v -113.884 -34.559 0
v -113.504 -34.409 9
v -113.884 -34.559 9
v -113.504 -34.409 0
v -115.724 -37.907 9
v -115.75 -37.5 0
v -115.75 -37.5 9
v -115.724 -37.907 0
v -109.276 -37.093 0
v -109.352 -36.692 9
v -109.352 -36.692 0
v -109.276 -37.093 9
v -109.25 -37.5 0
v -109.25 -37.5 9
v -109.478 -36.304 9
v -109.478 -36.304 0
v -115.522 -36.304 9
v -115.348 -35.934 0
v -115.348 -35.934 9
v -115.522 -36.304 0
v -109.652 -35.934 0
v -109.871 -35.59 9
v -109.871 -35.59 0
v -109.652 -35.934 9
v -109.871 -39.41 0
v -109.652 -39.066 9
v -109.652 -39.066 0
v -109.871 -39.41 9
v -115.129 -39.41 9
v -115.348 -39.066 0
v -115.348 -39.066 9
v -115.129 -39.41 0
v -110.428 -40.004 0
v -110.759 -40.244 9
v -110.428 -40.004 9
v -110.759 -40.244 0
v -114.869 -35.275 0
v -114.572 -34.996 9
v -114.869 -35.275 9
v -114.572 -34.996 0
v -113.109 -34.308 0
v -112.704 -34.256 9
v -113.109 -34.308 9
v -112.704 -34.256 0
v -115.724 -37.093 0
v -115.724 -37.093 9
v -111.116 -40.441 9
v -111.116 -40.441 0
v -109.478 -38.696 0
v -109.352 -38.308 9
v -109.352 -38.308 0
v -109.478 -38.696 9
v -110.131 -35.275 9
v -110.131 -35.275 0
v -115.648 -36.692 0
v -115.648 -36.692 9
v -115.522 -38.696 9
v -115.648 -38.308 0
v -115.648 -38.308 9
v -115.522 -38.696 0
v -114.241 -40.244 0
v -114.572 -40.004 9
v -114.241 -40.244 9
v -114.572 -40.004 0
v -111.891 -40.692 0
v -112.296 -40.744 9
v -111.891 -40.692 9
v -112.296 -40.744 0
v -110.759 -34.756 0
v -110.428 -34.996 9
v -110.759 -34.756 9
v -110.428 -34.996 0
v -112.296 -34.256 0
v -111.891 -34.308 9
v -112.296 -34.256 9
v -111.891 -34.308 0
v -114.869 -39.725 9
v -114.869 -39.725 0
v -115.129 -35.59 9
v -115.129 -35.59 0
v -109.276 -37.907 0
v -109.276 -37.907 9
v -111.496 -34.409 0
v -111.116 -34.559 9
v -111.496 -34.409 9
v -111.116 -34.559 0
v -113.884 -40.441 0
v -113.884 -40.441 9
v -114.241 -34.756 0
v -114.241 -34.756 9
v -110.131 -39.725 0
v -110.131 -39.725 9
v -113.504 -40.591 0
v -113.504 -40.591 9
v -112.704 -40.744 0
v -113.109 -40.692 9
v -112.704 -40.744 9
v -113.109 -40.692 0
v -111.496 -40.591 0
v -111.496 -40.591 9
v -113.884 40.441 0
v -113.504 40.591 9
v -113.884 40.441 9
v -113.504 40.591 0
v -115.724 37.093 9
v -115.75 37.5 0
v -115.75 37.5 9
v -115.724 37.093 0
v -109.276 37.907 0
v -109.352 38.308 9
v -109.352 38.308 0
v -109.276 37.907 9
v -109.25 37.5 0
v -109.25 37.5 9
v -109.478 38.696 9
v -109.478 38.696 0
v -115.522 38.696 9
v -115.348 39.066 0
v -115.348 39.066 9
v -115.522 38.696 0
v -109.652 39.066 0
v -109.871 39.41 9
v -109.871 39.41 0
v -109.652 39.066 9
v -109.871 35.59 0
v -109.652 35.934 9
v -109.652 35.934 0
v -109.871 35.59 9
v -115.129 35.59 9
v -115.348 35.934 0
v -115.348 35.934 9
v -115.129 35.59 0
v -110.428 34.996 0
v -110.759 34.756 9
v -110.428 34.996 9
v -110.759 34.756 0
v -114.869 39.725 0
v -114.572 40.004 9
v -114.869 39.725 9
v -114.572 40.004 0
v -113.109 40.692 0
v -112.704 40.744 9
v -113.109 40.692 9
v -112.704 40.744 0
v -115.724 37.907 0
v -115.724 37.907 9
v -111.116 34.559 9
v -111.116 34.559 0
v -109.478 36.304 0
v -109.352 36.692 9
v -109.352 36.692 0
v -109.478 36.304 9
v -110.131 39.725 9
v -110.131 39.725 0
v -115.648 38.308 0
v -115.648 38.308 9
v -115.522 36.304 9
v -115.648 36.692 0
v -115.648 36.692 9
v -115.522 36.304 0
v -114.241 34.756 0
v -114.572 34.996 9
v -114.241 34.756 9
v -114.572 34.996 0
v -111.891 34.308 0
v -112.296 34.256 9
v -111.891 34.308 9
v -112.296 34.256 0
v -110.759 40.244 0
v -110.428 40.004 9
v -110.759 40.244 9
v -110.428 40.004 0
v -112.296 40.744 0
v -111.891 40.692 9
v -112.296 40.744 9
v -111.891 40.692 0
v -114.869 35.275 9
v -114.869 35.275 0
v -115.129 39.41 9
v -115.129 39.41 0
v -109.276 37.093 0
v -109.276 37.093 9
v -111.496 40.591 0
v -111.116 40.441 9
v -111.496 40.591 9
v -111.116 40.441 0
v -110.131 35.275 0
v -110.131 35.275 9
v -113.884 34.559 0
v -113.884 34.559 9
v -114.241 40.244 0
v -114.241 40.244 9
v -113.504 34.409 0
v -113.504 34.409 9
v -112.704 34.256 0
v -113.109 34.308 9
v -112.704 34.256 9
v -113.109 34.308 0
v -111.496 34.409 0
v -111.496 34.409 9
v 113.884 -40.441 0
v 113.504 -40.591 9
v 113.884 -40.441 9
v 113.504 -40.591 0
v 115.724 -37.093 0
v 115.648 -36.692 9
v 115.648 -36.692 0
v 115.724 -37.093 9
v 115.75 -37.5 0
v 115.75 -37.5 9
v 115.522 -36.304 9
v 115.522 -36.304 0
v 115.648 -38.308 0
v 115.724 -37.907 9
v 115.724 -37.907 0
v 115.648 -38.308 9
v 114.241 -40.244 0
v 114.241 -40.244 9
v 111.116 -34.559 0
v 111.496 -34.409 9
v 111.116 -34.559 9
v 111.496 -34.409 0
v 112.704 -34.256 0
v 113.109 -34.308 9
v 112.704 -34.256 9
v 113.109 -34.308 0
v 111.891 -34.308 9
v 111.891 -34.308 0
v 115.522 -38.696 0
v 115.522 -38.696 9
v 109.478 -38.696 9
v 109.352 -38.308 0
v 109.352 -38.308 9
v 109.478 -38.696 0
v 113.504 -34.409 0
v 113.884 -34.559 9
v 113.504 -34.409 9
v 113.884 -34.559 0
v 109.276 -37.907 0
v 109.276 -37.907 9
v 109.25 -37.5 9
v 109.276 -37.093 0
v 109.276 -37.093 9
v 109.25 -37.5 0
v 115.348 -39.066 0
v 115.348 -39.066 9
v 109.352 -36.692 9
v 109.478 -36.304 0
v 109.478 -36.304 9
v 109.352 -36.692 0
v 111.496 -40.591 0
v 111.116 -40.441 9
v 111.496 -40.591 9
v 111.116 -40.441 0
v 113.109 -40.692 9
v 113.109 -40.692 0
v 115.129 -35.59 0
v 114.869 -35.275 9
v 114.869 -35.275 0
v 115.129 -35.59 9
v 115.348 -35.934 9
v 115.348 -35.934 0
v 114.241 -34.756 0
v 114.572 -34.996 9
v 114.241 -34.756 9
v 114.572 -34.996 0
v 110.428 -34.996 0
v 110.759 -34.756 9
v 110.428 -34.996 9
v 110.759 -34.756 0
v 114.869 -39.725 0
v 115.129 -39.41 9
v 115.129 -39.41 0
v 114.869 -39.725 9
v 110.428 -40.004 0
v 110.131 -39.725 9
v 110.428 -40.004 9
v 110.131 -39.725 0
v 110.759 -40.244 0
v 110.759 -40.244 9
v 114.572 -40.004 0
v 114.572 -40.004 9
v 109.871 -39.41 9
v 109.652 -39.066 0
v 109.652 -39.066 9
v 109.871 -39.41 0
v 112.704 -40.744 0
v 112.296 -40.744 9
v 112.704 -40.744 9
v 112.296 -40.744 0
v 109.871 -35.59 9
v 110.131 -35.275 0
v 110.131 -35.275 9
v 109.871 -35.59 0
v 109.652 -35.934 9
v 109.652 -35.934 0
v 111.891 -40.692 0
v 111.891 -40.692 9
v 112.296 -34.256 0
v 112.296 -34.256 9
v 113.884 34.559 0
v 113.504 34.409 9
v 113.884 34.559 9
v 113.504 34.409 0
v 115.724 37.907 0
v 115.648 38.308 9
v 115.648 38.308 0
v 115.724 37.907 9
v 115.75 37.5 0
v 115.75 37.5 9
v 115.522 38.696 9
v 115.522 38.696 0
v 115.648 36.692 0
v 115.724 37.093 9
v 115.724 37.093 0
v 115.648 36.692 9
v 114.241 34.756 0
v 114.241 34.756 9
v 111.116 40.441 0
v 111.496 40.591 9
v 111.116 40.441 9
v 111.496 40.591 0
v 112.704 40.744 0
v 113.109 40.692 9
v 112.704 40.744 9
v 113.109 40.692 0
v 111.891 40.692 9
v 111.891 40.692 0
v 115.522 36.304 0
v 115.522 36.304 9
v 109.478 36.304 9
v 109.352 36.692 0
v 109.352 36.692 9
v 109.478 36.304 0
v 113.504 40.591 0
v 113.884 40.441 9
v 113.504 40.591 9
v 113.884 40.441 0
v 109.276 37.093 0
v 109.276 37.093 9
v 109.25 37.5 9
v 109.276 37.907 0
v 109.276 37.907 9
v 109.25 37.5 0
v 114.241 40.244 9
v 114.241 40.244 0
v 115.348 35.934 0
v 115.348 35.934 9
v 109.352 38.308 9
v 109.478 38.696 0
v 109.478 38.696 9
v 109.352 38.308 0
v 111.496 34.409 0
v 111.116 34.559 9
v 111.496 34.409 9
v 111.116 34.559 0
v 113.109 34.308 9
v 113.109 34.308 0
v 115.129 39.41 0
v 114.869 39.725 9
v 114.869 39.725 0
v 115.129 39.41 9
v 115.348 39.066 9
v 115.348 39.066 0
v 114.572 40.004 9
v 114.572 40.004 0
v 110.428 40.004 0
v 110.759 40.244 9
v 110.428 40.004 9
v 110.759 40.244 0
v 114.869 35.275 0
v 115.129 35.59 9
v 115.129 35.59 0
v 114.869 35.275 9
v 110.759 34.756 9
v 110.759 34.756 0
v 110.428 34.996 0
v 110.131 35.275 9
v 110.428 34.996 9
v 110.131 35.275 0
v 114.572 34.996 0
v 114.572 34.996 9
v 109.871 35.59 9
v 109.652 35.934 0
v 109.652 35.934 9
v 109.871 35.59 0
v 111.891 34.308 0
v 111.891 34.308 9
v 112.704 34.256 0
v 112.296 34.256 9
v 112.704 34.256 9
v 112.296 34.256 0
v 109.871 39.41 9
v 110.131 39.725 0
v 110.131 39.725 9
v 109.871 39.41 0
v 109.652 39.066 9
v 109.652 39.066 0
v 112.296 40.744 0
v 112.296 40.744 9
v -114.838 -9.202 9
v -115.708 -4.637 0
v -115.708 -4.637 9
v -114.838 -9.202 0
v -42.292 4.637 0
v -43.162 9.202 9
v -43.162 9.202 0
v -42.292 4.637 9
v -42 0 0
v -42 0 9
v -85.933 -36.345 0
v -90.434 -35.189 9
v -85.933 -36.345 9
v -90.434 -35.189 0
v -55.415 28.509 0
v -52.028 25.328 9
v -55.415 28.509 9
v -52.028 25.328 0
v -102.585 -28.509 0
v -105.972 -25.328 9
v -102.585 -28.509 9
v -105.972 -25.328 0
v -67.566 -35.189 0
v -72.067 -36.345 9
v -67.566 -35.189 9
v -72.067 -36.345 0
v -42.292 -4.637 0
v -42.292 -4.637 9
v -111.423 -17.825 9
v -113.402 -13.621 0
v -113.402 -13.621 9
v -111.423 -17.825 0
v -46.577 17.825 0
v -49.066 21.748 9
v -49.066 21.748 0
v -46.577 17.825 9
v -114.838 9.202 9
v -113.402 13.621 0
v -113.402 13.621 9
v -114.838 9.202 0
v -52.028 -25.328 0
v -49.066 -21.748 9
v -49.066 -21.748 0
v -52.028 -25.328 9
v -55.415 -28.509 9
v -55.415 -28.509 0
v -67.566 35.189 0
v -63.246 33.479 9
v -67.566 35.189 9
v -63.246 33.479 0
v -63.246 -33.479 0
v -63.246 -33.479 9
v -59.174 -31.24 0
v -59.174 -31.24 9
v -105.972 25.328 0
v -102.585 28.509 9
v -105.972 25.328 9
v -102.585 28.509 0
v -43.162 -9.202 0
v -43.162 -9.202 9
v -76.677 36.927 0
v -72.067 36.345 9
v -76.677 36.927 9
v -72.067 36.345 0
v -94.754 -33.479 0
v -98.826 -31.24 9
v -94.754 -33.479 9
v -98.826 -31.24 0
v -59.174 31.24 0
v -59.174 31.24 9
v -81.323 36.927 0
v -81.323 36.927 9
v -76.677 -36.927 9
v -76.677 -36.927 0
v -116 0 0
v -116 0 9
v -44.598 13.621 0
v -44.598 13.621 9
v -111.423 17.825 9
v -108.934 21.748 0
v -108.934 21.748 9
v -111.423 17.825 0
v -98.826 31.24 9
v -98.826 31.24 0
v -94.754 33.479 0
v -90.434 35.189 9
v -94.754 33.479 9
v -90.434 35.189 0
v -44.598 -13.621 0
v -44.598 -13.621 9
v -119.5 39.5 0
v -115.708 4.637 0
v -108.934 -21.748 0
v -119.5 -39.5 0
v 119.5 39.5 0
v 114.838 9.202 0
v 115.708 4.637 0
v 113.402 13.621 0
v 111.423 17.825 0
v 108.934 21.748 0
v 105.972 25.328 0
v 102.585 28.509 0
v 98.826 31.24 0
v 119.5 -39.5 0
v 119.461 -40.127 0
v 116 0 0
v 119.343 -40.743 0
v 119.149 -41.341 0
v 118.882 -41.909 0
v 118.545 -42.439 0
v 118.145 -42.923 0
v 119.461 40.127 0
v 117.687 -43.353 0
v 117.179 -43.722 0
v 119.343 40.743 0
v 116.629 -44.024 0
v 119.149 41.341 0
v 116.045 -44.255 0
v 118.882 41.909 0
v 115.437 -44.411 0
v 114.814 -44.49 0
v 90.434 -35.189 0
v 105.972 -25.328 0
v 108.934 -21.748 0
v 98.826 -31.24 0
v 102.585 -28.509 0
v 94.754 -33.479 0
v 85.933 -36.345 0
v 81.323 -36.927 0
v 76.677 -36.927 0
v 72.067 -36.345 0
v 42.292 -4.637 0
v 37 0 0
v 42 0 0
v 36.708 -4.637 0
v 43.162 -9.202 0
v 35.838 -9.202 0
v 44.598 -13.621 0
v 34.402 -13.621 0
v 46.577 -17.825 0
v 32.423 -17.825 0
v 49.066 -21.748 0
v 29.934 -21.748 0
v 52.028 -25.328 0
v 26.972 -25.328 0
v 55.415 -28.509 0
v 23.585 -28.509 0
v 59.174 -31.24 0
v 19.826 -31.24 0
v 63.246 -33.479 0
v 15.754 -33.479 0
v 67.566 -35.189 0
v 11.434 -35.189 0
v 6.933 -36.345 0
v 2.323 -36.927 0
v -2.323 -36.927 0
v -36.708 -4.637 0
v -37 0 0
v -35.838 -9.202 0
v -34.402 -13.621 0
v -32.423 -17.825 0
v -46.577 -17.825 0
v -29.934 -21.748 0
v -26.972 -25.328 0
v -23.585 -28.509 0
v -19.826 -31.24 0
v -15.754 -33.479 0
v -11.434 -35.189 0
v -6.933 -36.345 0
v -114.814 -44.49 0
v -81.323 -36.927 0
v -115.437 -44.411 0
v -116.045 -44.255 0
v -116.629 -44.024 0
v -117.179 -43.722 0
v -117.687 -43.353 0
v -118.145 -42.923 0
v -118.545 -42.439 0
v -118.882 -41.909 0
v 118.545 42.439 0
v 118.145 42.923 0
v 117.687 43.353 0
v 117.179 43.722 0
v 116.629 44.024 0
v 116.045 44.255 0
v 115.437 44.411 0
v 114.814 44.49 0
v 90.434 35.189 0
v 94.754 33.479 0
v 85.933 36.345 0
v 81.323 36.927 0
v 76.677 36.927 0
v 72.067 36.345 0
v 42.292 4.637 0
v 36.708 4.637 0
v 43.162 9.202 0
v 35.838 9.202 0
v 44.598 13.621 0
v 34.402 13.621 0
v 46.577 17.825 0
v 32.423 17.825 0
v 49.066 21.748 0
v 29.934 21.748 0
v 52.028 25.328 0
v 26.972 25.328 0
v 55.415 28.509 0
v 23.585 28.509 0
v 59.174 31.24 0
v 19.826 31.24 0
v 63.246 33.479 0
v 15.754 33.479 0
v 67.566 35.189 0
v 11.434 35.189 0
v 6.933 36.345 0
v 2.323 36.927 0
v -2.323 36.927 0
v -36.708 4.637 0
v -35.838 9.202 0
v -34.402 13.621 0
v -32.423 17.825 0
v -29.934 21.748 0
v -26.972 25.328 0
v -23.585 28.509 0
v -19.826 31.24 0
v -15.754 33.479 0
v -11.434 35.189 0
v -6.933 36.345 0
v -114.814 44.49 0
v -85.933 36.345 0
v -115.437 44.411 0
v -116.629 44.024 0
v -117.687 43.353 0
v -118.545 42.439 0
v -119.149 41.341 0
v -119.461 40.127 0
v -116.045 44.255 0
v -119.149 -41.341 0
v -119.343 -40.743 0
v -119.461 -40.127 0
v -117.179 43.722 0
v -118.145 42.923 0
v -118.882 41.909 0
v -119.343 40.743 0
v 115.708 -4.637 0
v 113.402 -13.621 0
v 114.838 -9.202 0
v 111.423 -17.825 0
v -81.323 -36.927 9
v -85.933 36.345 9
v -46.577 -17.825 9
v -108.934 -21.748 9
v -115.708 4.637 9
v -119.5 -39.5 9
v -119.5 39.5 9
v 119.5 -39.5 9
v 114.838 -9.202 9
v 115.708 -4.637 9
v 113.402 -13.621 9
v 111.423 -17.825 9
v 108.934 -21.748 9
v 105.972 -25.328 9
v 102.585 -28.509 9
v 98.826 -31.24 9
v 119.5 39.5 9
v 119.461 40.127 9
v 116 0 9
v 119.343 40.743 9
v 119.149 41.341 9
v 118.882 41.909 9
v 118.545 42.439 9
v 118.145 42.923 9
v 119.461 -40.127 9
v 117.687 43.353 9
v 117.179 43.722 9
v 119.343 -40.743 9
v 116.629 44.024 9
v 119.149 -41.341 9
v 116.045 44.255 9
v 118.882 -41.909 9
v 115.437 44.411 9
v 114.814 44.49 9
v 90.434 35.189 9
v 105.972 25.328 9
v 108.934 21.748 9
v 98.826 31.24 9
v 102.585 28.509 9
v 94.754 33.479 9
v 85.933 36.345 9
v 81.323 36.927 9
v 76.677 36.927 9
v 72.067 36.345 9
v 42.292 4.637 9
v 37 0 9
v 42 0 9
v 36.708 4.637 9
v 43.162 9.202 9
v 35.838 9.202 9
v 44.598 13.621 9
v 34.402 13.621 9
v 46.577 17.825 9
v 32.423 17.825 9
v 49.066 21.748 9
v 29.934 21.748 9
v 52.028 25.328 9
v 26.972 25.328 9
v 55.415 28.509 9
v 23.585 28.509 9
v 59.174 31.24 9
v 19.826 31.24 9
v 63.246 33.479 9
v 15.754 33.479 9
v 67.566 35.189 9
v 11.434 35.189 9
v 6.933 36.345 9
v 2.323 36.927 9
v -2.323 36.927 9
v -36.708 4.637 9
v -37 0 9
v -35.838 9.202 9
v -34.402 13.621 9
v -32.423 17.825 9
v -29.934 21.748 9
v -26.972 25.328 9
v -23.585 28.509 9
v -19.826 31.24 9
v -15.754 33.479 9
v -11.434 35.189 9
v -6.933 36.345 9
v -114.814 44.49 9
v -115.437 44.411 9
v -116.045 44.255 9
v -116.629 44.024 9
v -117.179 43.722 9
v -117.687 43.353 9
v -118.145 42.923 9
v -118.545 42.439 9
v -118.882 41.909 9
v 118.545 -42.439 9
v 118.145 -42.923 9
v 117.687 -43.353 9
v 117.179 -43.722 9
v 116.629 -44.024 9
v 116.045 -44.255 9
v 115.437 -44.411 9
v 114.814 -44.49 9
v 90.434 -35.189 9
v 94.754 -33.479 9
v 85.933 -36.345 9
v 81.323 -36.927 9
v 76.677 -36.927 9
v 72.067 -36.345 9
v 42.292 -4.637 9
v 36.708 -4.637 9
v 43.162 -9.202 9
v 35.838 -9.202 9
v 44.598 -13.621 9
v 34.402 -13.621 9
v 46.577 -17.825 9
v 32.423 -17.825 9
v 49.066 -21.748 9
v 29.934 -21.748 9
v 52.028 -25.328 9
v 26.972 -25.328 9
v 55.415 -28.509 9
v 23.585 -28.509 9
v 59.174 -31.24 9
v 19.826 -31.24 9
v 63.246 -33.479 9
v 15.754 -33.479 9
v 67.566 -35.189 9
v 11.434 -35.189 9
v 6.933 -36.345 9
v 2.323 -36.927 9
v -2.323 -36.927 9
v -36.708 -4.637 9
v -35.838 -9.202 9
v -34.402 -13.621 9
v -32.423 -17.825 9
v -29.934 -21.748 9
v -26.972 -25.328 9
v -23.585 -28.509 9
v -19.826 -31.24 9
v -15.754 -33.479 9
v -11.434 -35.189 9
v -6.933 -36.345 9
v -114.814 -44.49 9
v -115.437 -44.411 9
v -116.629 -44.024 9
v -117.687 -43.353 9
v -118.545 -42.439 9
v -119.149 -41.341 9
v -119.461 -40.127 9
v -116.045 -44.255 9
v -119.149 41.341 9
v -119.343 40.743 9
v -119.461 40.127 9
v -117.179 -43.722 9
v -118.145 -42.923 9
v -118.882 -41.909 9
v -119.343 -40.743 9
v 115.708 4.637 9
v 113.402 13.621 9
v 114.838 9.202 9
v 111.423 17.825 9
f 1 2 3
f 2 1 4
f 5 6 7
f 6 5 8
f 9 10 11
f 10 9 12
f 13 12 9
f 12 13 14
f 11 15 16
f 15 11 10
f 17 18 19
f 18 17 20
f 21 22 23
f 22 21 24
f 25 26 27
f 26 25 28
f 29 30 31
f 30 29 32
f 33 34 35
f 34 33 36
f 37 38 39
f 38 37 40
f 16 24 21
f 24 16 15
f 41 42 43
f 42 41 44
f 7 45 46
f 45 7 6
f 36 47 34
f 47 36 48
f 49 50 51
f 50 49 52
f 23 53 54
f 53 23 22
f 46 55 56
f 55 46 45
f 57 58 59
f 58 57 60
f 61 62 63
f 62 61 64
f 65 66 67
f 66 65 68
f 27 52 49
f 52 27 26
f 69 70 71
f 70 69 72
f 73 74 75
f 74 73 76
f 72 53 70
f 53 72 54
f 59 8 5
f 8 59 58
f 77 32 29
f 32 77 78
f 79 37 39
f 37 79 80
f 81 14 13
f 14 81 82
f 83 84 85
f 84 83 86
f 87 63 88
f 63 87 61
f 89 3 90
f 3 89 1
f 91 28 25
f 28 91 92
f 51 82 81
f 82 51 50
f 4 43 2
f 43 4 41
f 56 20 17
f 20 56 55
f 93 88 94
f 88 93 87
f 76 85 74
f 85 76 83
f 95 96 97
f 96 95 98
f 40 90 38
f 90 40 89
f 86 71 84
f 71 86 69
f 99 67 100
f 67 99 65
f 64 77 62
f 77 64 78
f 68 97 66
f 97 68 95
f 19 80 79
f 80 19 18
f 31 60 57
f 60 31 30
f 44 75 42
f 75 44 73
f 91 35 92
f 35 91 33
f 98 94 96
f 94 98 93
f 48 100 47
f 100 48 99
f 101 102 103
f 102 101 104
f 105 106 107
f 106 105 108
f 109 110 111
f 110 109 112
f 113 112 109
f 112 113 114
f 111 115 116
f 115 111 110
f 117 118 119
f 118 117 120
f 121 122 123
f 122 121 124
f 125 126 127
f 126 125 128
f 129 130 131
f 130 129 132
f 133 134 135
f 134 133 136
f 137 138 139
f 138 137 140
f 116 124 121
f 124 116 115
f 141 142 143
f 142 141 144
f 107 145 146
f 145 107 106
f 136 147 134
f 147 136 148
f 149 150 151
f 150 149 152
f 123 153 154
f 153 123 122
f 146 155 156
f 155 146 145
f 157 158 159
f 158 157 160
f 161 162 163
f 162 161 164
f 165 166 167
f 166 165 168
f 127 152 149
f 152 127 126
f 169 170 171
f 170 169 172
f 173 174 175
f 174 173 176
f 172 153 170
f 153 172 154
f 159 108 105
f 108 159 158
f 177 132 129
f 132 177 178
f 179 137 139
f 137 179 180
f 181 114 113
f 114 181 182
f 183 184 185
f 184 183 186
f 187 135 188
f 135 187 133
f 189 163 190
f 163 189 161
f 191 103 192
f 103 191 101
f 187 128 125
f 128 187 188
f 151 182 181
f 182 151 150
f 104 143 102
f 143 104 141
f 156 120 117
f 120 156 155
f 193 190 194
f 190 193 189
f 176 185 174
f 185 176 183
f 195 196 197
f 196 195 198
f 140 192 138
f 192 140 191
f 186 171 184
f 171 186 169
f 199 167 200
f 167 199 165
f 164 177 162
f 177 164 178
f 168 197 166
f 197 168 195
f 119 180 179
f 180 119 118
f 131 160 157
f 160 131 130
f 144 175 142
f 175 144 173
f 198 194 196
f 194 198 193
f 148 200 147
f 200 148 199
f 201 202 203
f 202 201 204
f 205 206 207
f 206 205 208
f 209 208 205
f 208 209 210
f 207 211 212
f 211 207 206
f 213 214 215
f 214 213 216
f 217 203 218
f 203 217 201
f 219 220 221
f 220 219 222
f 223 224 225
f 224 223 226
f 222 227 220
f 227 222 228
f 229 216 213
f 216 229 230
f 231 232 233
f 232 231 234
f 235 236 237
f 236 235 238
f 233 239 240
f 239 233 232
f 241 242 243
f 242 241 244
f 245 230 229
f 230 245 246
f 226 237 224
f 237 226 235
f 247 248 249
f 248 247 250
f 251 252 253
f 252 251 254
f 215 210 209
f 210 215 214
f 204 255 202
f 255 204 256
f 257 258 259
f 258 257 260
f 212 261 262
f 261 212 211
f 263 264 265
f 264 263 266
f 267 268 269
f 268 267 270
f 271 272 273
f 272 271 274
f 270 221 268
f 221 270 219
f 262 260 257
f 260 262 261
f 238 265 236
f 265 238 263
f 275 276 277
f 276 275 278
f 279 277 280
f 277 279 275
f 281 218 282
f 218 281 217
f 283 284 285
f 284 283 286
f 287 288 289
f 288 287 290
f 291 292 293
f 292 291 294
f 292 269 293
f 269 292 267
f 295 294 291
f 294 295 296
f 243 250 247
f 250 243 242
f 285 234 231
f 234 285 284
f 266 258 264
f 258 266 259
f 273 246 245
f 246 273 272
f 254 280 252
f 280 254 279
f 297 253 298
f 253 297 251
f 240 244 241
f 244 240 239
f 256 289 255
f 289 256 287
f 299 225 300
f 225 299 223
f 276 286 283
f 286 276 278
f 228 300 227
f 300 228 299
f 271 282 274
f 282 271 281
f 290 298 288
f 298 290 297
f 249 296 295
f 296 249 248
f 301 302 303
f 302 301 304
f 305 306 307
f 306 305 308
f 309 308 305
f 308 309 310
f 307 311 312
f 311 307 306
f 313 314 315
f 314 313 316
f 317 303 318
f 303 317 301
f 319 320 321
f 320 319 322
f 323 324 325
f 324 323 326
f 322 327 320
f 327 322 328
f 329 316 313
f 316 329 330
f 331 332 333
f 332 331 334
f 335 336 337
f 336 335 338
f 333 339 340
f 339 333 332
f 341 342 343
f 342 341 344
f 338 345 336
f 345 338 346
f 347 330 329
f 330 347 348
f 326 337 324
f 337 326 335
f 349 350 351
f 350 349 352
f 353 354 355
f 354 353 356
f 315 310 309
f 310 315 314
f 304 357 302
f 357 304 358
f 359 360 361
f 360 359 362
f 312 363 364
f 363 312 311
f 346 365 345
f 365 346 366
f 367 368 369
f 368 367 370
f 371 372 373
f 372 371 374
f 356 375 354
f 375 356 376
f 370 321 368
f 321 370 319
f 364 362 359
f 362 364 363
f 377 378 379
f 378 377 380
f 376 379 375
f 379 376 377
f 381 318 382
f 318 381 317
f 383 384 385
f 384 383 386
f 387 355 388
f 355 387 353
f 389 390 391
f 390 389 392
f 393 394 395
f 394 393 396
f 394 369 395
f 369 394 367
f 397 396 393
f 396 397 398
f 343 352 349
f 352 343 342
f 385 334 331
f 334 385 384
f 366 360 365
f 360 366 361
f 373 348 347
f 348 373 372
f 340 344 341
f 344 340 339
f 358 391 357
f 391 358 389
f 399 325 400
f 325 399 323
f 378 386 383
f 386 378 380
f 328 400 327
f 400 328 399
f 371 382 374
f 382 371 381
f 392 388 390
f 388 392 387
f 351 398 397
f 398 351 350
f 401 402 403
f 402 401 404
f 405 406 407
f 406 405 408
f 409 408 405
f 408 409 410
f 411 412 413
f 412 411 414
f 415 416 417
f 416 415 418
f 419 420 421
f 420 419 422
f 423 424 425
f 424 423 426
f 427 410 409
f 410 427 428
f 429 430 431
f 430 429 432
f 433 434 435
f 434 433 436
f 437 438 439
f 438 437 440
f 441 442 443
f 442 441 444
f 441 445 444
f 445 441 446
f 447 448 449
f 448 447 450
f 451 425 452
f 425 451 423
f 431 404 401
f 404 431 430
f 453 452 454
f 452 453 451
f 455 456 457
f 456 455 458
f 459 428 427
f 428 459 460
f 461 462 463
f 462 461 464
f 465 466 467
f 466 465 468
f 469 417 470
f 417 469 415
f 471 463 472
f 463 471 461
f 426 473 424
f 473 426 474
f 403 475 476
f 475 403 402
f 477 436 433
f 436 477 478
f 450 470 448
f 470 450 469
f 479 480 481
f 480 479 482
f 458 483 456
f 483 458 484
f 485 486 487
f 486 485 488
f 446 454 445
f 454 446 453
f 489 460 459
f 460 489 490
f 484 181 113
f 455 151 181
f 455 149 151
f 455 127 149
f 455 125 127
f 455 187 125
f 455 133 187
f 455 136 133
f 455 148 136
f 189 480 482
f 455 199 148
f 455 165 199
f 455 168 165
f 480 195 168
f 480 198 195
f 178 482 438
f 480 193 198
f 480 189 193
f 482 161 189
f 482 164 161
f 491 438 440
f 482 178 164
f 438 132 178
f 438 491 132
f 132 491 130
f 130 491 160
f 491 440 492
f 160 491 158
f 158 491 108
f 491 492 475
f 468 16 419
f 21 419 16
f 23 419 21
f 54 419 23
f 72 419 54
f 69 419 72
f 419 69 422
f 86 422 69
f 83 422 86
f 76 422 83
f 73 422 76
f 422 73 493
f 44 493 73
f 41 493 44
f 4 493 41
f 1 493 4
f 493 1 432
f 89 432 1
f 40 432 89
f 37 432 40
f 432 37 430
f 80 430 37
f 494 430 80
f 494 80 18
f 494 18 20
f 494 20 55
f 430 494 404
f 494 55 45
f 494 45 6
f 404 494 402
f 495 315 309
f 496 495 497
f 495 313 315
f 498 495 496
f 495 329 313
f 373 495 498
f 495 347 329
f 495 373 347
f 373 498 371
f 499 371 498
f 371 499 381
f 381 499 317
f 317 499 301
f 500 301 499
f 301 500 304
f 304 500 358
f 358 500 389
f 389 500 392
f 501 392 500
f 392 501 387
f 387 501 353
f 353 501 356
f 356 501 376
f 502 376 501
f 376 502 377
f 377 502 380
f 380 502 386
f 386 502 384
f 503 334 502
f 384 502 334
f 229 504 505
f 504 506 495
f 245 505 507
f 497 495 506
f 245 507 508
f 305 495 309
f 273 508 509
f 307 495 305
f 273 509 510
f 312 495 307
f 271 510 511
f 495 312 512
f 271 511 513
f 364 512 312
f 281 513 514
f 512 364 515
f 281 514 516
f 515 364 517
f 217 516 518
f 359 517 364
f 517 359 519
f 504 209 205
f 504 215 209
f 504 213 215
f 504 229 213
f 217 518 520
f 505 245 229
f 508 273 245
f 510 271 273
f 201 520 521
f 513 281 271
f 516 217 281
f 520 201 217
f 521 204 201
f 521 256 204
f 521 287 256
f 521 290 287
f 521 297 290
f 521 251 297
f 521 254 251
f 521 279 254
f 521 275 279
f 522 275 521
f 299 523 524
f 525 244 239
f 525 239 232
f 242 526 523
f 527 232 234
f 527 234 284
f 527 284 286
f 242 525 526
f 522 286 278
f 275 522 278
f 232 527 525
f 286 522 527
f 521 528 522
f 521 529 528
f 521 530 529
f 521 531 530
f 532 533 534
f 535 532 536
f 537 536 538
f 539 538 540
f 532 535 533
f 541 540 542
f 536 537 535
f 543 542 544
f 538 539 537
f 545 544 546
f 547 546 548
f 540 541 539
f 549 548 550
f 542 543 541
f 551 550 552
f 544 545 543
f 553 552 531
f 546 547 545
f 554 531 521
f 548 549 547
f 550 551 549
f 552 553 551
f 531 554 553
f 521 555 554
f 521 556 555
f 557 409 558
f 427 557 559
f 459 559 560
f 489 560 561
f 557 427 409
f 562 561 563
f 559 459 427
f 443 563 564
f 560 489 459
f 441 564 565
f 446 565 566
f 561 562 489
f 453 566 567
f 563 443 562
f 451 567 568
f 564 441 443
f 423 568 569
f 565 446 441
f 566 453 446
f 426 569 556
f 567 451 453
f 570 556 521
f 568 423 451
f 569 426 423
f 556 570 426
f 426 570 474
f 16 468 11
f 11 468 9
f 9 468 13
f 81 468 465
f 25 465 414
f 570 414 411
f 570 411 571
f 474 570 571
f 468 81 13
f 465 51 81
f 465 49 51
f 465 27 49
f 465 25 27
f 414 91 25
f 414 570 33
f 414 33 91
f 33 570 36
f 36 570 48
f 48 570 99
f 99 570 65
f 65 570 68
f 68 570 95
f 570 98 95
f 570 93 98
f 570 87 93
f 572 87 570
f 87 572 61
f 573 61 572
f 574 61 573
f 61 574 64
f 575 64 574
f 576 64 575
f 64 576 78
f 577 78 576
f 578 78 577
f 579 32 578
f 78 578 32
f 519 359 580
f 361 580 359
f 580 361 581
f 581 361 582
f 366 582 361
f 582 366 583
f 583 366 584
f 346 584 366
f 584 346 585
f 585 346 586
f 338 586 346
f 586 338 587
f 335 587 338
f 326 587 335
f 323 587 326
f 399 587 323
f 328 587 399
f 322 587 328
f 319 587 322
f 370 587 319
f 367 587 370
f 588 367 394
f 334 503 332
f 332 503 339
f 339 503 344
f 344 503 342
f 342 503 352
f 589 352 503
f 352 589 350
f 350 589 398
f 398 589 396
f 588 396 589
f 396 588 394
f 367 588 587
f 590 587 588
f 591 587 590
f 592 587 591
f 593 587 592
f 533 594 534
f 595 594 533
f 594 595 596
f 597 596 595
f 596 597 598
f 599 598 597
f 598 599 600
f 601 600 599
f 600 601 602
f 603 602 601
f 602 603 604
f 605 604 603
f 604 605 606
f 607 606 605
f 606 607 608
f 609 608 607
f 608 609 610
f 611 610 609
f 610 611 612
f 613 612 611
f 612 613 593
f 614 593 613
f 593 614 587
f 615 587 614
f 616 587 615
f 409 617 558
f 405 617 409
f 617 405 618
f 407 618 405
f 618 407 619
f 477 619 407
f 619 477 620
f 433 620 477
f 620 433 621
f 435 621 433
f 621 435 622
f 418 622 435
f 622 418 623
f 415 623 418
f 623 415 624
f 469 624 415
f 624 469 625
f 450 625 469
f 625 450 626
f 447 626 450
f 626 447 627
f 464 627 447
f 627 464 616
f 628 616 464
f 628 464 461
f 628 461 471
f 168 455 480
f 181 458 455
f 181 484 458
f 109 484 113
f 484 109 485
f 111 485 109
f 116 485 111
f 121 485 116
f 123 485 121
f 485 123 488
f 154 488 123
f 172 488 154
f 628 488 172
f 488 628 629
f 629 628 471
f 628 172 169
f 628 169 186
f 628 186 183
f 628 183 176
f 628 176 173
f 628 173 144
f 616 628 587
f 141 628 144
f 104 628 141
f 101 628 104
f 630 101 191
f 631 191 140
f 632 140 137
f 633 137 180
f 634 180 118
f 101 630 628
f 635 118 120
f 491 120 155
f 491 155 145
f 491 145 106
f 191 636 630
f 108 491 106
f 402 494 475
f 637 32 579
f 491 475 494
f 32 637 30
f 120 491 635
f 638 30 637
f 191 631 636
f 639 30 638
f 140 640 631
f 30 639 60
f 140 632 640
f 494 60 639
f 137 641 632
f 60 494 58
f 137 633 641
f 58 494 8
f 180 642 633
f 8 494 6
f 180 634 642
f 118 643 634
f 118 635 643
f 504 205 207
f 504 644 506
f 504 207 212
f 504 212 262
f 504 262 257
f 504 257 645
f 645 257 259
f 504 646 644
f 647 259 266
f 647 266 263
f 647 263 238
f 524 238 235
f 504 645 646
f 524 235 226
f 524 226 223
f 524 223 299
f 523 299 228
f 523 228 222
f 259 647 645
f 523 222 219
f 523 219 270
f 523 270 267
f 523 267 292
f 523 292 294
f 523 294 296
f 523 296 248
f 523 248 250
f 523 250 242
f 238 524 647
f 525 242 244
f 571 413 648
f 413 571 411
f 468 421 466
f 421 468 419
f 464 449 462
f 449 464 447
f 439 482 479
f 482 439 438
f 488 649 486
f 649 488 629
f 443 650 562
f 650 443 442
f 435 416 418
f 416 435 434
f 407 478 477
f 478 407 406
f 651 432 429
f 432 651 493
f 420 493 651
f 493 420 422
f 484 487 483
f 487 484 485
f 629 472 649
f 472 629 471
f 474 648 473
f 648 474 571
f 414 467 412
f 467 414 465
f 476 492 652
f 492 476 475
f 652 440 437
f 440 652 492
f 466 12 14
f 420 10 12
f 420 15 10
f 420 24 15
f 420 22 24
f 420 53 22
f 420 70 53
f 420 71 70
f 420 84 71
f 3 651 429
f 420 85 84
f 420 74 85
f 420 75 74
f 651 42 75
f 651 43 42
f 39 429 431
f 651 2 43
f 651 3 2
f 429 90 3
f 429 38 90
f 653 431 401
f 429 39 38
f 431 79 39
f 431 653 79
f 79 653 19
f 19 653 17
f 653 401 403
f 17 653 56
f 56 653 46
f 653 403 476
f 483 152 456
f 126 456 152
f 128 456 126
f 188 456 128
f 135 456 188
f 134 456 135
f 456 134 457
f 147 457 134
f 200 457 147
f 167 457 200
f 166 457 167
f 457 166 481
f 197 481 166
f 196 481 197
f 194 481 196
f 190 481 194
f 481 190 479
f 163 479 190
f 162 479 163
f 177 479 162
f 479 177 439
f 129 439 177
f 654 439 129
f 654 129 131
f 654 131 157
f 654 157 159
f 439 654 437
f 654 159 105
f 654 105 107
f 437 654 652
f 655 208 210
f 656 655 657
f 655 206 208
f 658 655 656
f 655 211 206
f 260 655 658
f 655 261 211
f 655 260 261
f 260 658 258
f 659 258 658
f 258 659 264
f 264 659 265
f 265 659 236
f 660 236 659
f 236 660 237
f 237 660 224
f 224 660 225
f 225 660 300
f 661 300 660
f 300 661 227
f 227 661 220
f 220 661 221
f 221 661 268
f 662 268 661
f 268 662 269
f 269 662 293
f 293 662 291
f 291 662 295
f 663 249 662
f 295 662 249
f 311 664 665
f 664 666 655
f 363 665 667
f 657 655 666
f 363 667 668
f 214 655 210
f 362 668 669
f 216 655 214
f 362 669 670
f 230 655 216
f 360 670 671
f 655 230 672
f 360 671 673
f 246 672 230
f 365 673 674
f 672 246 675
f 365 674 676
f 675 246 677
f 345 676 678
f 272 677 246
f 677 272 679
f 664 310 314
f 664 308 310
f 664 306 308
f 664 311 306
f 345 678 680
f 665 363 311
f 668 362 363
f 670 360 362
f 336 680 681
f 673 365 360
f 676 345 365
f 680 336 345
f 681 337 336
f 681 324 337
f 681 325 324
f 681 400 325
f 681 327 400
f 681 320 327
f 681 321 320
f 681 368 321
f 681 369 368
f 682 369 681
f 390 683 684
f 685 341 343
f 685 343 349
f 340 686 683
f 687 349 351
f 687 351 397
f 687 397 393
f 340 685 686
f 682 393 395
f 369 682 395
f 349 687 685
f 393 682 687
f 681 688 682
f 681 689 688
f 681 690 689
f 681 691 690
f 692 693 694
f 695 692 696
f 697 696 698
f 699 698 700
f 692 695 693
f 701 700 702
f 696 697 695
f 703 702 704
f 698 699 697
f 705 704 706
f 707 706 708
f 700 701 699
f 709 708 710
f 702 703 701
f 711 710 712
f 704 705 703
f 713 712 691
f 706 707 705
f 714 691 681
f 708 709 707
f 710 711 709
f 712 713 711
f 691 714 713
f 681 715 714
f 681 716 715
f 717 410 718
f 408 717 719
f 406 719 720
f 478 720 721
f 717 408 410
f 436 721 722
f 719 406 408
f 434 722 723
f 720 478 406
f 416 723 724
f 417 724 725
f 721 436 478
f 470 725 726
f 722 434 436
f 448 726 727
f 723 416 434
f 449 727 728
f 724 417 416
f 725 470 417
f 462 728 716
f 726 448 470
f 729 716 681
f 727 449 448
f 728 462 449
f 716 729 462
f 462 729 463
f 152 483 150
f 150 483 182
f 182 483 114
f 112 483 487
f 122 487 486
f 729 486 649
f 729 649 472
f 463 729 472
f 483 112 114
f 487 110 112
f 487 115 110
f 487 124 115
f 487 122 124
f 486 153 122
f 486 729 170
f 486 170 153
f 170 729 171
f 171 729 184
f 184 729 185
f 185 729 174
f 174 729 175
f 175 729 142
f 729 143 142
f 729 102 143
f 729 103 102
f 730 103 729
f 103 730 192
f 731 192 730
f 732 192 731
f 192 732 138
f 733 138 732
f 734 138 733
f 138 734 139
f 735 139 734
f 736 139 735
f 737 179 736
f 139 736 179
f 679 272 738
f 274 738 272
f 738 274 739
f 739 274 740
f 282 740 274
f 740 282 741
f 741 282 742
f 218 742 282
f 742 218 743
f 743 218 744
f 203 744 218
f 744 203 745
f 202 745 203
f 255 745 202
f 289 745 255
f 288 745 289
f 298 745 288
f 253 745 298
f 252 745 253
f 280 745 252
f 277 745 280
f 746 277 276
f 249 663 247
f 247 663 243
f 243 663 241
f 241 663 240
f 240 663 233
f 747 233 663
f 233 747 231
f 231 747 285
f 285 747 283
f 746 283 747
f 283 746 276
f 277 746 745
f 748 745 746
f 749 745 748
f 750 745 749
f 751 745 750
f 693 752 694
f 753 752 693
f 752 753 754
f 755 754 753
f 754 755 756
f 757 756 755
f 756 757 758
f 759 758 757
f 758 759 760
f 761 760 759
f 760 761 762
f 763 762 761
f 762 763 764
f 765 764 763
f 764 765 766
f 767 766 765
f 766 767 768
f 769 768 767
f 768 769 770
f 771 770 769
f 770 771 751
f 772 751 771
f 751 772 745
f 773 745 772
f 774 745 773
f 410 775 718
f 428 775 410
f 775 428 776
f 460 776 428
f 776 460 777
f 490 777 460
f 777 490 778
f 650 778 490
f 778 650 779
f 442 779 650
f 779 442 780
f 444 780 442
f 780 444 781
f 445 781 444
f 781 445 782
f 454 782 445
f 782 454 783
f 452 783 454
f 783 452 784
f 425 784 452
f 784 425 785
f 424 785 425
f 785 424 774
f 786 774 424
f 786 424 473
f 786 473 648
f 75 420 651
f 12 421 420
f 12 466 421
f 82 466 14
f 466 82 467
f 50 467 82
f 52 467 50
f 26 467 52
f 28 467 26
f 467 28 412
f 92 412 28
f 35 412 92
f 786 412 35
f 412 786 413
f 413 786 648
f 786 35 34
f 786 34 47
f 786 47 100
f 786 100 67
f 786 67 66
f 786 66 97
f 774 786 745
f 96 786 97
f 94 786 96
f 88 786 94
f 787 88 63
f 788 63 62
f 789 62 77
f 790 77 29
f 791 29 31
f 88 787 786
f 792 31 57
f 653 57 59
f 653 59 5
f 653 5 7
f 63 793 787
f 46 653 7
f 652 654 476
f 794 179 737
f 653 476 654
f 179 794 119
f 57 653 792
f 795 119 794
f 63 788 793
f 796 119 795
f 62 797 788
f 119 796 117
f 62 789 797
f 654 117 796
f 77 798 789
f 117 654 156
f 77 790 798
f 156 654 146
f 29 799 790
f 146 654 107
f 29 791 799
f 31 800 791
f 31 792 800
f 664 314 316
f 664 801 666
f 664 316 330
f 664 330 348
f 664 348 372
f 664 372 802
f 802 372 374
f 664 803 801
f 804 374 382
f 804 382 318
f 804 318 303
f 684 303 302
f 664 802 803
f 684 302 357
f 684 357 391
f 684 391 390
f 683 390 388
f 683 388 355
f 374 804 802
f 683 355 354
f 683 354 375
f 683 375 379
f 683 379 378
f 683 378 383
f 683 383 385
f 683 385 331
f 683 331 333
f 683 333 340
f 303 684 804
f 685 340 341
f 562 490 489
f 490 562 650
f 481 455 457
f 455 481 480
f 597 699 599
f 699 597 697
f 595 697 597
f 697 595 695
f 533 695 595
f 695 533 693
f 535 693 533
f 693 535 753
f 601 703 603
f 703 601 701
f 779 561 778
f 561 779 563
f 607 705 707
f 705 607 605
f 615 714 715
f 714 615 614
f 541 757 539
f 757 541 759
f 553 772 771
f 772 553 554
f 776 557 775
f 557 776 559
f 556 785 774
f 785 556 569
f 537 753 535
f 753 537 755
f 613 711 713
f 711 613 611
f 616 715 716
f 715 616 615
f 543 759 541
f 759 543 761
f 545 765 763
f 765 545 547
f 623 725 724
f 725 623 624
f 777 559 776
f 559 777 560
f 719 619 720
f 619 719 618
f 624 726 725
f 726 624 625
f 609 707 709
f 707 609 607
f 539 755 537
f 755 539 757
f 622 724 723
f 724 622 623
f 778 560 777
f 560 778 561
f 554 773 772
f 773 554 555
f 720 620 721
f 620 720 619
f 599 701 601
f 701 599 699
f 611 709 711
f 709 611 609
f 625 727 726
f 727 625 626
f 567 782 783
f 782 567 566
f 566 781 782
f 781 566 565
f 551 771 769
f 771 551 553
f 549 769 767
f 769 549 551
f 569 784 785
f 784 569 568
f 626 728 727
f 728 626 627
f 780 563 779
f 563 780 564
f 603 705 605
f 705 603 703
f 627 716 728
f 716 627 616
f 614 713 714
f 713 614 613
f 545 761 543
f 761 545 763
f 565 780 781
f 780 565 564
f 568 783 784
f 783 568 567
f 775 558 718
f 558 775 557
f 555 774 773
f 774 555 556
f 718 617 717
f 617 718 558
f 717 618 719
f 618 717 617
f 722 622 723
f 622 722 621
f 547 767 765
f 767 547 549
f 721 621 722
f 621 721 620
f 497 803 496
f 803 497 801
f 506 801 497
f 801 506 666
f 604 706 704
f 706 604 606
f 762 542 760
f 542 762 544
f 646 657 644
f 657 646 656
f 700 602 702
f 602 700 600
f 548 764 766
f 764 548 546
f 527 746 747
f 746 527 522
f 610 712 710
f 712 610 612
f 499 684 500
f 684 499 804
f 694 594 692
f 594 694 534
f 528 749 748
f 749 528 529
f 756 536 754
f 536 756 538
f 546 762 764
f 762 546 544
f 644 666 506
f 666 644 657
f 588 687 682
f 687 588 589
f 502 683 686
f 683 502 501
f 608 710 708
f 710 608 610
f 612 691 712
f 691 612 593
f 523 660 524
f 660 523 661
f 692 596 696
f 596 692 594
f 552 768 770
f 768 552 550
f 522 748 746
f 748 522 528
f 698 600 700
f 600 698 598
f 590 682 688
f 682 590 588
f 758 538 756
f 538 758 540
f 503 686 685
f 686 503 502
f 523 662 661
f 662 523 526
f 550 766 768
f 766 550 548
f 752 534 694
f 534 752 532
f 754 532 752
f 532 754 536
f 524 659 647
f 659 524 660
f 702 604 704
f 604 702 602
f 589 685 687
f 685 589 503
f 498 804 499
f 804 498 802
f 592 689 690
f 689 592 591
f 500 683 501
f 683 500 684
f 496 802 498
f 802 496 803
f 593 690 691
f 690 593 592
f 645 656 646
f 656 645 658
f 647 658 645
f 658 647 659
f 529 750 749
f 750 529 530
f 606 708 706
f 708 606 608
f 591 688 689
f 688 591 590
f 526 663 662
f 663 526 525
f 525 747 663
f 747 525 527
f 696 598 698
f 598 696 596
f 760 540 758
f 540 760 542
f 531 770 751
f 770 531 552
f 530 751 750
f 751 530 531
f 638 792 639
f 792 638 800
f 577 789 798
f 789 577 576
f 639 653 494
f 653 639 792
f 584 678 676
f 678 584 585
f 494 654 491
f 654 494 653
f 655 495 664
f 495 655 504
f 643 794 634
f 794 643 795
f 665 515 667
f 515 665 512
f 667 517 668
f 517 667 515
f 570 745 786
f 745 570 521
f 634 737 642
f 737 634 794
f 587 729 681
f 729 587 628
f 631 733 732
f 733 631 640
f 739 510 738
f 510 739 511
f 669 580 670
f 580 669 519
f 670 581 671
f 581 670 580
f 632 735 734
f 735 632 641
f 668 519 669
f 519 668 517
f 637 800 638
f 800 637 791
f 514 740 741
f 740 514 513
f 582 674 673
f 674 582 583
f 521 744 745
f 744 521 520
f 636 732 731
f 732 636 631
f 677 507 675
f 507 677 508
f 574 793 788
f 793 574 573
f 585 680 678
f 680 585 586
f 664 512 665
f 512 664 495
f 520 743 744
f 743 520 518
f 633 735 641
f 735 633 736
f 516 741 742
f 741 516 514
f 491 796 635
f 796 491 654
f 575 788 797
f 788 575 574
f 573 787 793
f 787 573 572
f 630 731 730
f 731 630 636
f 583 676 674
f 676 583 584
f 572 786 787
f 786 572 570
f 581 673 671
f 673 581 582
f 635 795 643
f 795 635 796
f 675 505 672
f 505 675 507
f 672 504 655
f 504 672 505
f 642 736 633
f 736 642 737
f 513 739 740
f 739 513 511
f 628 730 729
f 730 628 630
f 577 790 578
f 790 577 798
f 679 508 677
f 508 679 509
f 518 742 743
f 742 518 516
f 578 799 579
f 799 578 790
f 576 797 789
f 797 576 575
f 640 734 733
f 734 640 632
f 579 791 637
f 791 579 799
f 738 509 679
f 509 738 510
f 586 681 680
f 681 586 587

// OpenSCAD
$fn = 50;

difference() {
	union() {
		hull() {
			translate(v = [-114.5, 39.5, 0]) {
				cylinder(h = 9, r = 5);
			}
			translate(v = [114.5, 39.5, 0]) {
				cylinder(h = 9, r = 5);
			}
			translate(v = [-114.5, -39.5, 0]) {
				cylinder(h = 9, r = 5);
			}
			translate(v = [114.5, -39.5, 0]) {
				cylinder(h = 9, r = 5);
			}
		}
	}
	union() {
		translate(v = [-112.5, -37.5, -100.0]) {
			cylinder(h = 200, r = 3.25);
		}
		translate(v = [-112.5, 37.5, -100.0]) {
			cylinder(h = 200, r = 3.25);
		}
		translate(v = [112.5, -37.5, -100.0]) {
			cylinder(h = 200, r = 3.25);
		}
		translate(v = [112.5, 37.5, -100.0]) {
			cylinder(h = 200, r = 3.25);
		}
		translate(v = [-112.5, -37.5, -100.0]) {
			cylinder(h = 200, r = 1.8);
		}
		translate(v = [-112.5, 37.5, -100.0]) {
			cylinder(h = 200, r = 1.8);
		}
		translate(v = [112.5, -37.5, -100.0]) {
			cylinder(h = 200, r = 1.8);
		}
		translate(v = [112.5, 37.5, -100.0]) {
			cylinder(h = 200, r = 1.8);
		}
		translate(v = [-79.0, 0, 0.0]) {
			cylinder(h = 9, r = 37.0);
		}
		cylinder(h = 9, r = 37.0);
		translate(v = [79.0, 0, 0.0]) {
			cylinder(h = 9, r = 37.0);
		}
	}
}
